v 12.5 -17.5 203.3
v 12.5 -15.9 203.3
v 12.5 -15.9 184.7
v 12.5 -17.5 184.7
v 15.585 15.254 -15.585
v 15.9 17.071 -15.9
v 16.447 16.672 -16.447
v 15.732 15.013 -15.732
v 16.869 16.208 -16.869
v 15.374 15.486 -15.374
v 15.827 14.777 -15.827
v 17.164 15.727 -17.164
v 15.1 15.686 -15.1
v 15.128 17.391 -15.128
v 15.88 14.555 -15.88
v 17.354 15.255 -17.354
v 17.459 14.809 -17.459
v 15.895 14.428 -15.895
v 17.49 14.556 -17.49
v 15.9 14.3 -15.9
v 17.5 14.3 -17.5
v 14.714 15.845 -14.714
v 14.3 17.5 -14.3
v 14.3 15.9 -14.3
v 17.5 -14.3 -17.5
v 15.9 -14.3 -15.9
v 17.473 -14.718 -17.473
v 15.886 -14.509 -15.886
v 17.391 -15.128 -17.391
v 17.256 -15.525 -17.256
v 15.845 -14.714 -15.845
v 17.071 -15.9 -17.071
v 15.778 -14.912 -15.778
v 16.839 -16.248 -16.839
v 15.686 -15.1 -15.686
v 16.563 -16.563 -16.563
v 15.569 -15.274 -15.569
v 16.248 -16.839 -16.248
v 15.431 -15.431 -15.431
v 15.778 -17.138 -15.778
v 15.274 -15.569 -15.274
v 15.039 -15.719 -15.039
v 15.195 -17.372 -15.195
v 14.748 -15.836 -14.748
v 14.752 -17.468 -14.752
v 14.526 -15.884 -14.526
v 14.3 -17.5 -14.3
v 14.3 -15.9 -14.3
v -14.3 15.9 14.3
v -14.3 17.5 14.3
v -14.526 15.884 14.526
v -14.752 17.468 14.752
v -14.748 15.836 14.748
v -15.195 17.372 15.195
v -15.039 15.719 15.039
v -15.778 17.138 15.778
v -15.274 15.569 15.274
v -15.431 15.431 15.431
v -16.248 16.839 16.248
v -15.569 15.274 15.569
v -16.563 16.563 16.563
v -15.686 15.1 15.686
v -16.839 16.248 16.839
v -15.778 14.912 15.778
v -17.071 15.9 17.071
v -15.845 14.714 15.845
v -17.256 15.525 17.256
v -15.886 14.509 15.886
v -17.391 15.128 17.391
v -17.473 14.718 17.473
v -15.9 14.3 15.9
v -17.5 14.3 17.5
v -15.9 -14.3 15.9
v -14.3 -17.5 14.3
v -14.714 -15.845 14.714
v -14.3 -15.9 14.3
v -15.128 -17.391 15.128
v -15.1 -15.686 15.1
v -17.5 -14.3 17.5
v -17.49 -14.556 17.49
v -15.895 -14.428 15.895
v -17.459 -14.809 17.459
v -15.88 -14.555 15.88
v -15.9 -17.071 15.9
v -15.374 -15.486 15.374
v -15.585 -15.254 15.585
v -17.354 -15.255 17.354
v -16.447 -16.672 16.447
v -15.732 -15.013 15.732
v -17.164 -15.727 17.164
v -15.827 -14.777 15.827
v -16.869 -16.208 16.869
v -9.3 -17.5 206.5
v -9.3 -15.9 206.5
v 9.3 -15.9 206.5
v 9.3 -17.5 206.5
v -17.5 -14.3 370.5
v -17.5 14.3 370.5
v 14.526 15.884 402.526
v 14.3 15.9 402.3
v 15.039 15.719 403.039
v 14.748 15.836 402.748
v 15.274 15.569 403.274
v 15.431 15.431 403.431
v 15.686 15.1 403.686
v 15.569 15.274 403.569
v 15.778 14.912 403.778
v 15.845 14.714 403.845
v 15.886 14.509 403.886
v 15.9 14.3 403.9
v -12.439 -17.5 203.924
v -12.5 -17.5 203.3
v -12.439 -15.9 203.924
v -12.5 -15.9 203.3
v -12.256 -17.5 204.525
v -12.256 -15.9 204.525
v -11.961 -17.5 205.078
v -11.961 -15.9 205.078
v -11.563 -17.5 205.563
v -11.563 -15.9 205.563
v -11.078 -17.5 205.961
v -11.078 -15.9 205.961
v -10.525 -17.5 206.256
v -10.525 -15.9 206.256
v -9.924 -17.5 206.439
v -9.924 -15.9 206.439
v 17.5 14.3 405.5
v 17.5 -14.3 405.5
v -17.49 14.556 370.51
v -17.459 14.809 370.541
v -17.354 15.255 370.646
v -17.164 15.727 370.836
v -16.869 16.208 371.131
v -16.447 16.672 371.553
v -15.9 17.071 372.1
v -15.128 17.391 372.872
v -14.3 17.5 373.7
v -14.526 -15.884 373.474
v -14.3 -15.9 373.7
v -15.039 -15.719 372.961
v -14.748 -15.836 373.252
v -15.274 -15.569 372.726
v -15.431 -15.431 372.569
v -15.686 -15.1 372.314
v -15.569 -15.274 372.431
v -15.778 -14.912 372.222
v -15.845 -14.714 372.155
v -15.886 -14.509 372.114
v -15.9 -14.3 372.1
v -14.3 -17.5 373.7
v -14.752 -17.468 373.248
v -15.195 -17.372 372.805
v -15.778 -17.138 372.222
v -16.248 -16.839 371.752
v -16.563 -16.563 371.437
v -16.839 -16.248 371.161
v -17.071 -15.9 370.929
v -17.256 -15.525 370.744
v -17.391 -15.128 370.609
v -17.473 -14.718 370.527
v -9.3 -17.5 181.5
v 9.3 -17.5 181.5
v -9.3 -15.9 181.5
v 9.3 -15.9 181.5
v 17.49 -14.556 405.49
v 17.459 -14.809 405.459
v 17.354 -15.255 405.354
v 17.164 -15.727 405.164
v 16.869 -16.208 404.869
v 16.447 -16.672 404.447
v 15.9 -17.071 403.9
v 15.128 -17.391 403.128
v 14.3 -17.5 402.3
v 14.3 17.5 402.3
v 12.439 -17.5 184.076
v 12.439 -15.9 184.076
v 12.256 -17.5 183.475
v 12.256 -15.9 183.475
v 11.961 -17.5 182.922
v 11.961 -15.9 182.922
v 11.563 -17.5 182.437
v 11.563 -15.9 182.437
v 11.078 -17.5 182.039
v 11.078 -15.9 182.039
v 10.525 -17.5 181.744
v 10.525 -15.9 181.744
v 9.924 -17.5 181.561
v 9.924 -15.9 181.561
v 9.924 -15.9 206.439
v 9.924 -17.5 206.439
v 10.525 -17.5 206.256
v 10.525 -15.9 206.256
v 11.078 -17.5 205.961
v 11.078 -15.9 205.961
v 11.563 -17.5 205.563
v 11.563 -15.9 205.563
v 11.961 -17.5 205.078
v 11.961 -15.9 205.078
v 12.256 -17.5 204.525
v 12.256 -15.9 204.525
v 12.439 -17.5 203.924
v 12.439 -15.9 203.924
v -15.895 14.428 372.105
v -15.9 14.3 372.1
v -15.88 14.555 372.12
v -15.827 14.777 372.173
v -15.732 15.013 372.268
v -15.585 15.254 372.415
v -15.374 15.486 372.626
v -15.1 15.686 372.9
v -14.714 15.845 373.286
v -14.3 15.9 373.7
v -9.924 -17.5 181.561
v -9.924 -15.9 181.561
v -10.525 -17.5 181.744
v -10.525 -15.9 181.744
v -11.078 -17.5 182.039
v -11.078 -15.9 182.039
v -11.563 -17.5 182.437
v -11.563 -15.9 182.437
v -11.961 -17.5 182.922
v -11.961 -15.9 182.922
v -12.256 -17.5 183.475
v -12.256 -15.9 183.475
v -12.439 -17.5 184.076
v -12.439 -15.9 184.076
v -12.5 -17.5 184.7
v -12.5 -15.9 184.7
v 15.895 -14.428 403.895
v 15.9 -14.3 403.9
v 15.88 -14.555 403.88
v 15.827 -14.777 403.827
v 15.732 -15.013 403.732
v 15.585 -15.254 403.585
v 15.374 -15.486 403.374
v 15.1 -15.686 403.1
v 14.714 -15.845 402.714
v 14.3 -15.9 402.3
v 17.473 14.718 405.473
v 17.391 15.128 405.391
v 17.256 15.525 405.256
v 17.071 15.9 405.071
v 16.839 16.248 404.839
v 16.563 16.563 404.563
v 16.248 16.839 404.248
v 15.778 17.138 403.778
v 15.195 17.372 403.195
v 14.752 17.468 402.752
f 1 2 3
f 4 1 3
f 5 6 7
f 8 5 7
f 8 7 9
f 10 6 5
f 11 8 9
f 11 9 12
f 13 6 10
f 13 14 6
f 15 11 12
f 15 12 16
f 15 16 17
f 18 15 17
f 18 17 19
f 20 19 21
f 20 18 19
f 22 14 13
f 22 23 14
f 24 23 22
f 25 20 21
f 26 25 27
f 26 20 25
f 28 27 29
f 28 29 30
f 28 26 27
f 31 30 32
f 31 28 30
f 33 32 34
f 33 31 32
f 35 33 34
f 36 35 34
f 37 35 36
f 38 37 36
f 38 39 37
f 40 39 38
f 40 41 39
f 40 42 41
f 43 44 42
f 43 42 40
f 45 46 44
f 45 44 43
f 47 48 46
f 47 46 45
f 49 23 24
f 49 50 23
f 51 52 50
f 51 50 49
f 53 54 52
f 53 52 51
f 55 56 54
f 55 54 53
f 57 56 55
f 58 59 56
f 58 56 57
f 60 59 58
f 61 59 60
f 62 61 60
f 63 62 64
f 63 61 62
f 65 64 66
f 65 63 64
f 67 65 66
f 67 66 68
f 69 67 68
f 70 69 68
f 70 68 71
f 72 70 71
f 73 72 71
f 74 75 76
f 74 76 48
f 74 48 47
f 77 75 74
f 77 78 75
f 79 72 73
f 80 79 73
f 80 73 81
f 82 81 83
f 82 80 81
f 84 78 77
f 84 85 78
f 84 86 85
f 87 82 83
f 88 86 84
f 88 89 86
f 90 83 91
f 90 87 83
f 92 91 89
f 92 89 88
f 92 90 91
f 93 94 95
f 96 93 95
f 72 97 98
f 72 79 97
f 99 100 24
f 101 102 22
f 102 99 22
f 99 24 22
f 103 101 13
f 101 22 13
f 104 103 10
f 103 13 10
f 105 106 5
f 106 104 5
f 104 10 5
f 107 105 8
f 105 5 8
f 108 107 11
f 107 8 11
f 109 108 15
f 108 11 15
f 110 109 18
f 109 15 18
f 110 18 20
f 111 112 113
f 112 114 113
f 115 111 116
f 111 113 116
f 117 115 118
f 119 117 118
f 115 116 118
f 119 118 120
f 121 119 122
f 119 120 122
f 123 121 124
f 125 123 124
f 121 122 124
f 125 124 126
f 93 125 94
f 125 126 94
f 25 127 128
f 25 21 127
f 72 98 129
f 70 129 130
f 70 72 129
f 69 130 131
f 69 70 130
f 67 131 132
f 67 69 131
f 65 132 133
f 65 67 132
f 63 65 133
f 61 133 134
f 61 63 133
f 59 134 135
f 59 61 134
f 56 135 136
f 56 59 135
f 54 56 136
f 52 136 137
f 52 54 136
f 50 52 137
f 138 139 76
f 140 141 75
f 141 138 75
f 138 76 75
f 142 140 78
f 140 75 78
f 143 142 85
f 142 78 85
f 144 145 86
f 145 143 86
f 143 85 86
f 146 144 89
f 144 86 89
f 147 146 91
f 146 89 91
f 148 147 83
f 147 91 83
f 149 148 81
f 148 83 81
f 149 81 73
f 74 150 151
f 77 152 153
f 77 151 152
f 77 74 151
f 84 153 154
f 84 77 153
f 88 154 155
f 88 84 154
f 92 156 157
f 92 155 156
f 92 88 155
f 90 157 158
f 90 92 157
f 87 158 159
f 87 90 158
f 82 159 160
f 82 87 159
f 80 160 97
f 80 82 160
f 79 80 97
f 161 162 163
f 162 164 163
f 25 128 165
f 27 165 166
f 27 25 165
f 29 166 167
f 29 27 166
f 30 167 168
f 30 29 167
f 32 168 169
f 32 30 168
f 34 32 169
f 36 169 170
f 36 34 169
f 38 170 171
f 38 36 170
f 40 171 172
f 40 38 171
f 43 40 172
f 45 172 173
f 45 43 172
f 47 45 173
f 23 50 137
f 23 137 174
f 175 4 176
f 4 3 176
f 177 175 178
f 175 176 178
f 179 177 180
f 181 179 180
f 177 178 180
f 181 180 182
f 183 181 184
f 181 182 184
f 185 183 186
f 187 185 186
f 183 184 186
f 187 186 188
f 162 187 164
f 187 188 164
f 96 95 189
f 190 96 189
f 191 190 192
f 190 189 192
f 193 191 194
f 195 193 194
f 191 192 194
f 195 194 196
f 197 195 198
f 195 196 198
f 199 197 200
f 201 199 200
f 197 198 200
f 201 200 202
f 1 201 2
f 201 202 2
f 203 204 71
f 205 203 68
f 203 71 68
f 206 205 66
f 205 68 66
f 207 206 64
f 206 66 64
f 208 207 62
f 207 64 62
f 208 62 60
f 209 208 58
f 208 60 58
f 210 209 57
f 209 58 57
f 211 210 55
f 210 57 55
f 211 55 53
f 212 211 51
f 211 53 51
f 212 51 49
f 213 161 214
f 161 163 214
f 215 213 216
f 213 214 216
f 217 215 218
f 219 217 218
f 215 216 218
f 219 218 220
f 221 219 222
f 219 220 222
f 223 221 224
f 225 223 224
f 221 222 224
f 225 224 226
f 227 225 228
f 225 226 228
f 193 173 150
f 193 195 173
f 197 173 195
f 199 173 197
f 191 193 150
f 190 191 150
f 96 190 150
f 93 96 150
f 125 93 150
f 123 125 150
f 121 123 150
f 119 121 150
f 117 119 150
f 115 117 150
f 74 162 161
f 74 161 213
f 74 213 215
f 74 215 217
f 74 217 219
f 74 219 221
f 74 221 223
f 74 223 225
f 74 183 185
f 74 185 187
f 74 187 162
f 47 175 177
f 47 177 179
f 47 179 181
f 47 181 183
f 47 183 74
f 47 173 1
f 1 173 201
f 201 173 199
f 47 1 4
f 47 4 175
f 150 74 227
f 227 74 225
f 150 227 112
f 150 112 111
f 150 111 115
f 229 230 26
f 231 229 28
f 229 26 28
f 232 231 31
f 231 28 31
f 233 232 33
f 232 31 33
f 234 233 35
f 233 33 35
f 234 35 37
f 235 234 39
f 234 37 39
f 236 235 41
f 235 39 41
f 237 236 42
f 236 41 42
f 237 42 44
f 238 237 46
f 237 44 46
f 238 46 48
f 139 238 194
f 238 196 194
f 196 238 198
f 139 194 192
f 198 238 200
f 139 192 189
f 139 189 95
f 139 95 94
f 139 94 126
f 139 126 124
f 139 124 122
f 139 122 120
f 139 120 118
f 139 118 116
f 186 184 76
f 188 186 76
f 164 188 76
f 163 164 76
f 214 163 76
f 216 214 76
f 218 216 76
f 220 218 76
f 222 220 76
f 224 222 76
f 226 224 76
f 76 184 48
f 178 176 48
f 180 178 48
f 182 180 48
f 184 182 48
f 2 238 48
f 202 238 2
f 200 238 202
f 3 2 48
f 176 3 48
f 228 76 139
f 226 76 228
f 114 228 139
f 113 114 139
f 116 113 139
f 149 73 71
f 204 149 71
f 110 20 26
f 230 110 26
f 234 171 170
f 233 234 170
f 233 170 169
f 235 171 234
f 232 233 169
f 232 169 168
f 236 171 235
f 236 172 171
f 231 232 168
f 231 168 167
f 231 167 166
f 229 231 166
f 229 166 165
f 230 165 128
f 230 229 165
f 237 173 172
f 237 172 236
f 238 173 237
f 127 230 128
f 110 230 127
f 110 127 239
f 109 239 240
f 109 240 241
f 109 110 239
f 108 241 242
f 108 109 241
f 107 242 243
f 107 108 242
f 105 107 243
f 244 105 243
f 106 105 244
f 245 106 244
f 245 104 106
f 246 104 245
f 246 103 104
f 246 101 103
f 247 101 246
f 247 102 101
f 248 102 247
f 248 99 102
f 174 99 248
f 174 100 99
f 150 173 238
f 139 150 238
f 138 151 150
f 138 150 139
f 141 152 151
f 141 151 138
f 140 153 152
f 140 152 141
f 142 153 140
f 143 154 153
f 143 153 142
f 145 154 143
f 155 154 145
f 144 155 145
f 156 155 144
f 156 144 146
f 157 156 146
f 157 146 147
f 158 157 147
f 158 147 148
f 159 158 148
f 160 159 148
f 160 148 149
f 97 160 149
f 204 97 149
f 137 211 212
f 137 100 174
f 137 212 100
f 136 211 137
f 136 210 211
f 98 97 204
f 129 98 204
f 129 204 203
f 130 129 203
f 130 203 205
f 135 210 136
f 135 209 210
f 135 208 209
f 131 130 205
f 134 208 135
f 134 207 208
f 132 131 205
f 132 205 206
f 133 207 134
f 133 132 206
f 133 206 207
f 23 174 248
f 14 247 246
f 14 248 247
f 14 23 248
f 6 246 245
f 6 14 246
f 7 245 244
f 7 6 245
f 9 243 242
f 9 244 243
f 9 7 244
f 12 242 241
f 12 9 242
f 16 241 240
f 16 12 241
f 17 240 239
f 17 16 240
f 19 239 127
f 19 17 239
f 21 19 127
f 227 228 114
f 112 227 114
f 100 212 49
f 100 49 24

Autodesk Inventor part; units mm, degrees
ref_plane "Start plane" through (0, 0, -17.5) normal (0, 0, 1) x (1, 0, 0)
ref_plane "End plane" through (0, 0, 405.5) normal (0, 0, 1) x (1, 0, 0)
sketch "Sketch" plane through (0, 0, 0) normal (0, 0, 1) x (1, 0, 0)
  line L0 (-17.5, -14.3) -> (-17.5, 14.3)
  line L1 (-14.3, 17.5) -> (14.3, 17.5)
  line L2 (17.5, 14.3) -> (17.5, -14.3)
  line L3 (14.3, -17.5) -> (-14.3, -17.5)
  arc A0 (-17.5, -14.3) -> (-14.3, -17.5) centre (-14.3, -14.3) ccw
  arc A1 (-14.3, 17.5) -> (-17.5, 14.3) centre (-14.3, 14.3) ccw
  arc A2 (17.5, 14.3) -> (14.3, 17.5) centre (14.3, 14.3) ccw
  arc A3 (14.3, -17.5) -> (17.5, -14.3) centre (14.3, -14.3) ccw
  arc A4 (-14.3, 15.9) -> (-15.9, 14.3) centre (-14.3, 14.3) ccw
  line L4 (-14.3, 15.9) -> (14.3, 15.9)
  arc A5 (15.9, 14.3) -> (14.3, 15.9) centre (14.3, 14.3) ccw
  line L5 (15.9, 14.3) -> (15.9, -14.3)
  arc A6 (14.3, -15.9) -> (15.9, -14.3) centre (14.3, -14.3) ccw
  line L6 (14.3, -15.9) -> (-14.3, -15.9)
  arc A7 (-15.9, -14.3) -> (-14.3, -15.9) centre (-14.3, -14.3) ccw
  line L7 (-15.9, -14.3) -> (-15.9, 14.3)
  line L8 (0, 25.4278) -> (0, -25.4278) construction
  line L9 (-25.4278, 0) -> (25.4278, 0) construction
  dimension "d7" = 3.2
  dimension "d10" = 35
  dimension "d11" = 35
  dimension "d12" = 1.6
  dimension "d15" = 17.5
  dimension "d16" = 17.5
extrude "Body" add sketch "Sketch" along normal up to surface (423 mm away) from surface at -17.5
sketch "Sketch3" plane through (0, 0, 0) normal (0, 0, 1) x (1, 0, 0)
  line L0 (0, 0) -> (10, 0)
ref_plane "Work Plane3" through (0, 0, 0) normal (0, -1, 0) x (1, 0, 0)
sketch "Sketch4" plane through (0, 0, 0) normal (0, -1, 0) x (1, 0, 0)
  line L0 (-2, -17.5) -> (12, -17.5)
  line L1 (-2, 405.5) -> (12, 405.5)
  dimension "d18" = 423
ref_plane "Work Plane4" through (0, 0, 194) normal (0, -1, 0) x (1, 0, 0)
ref_plane "Work Plane5" through (0, -150, 194) normal (0, -1, 0) x (1, 0, 0)
ref_plane "Work Plane6" through (0, -75, 194) normal (0, -1, 0) x (1, 0, 0)
sketch "Sketch5" plane through (0, -75, 194) normal (0, -1, 0) x (1, 0, 0)
  arc A0 (-12.5, -9.3) -> (-9.3, -12.5) centre (-9.3, -9.3) ccw
  line L0 (-12.5, -9.3) -> (-12.5, 9.3)
  arc A1 (-9.3, 12.5) -> (-12.5, 9.3) centre (-9.3, 9.3) ccw
  line L1 (-9.3, 12.5) -> (9.3, 12.5)
  arc A2 (12.5, 9.3) -> (9.3, 12.5) centre (9.3, 9.3) ccw
  line L2 (12.5, 9.3) -> (12.5, -9.3)
  arc A3 (9.3, -12.5) -> (12.5, -9.3) centre (9.3, -9.3) ccw
  line L3 (9.3, -12.5) -> (-9.3, -12.5)
  arc A4 (-9.3, 10.9) -> (-10.9, 9.3) centre (-9.3, 9.3) ccw
  line L4 (-9.3, 10.9) -> (9.3, 10.9)
  arc A5 (10.9, 9.3) -> (9.3, 10.9) centre (9.3, 9.3) ccw
  line L5 (10.9, 9.3) -> (10.9, -9.3)
  arc A6 (9.3, -10.9) -> (10.9, -9.3) centre (9.3, -9.3) ccw
  line L6 (9.3, -10.9) -> (-9.3, -10.9)
  arc A7 (-10.9, -9.3) -> (-9.3, -10.9) centre (-9.3, -9.3) ccw
  line L7 (-10.9, -9.3) -> (-10.9, 9.3)
extrude "Extrusion2" cut sketch "Sketch5" along normal up to surface (150 mm away) from surface at -75 contours L0 A1 L1 A2 L2 A3 L3 A0 | L4 A5 L5 A6 L6 A7 L7 A4
ref_plane "Work Plane7" through (-12.5983, 0, 400.9862) normal (-0.4912, 0, 0.871) x (0.871, 0, 0.4912)
split "Split1" plane through (-12.5983, 0, 400.9862) removes the side toward (-0.4912, 0, 0.871)
ref_plane "Work Plane8" through (-687.6928, 0, 367.7357) normal (-0.4912, 0, -0.871) x (-0.871, 0, 0.4912)
split "Split2" plane through (-687.6928, 0, 367.7357) removes the side toward (-0.4912, 0, -0.871)
ref_plane "Work Plane9" through (17.5, 0, -17.5) normal (-0.7071, 0, -0.7071) x (-0.7071, 0, 0.7071)
split "Split3" plane through (17.5, 0, -17.5) removes the side toward (-0.7071, 0, -0.7071)
ref_plane "Work Plane10" through (17.5, 0, 405.5) normal (-0.7071, 0, 0.7071) x (0.7071, 0, 0.7071)
split "Split4" plane through (17.5, 0, 405.5) removes the side toward (-0.7071, 0, 0.7071)
equation "\"d7\" = G_IR"
equation "\"d10\" = G_H"
equation "\"d11\" = G_W"
equation "\"d12\" = G_T"
equation "\"d15\" = 0.5 * d10"
equation "\"d16\" = 0.5 * d11"
equation "\"d3\" = G_L"
equation "\"G_W\" = 35"
equation "\"G_H\" = 35"
equation "\"G_T\" = 1.6"
equation "\"G_IR\" = 3.2"
equation "\"G_L\" = d18"
equation "\"G_OFFSET_START\" = 17.5"
equation "\"G_OFFSET_END\" = 17.5"
equation "\"d13\" = -G_OFFSET_START"
equation "\"d14\" = G_OFFSET_END + B_L"
equation "\"B_L\" = 388"
properties part number "AS 1163 - C350L0 35x35x1.6 SHS - 423" material "Steel, Mild"
